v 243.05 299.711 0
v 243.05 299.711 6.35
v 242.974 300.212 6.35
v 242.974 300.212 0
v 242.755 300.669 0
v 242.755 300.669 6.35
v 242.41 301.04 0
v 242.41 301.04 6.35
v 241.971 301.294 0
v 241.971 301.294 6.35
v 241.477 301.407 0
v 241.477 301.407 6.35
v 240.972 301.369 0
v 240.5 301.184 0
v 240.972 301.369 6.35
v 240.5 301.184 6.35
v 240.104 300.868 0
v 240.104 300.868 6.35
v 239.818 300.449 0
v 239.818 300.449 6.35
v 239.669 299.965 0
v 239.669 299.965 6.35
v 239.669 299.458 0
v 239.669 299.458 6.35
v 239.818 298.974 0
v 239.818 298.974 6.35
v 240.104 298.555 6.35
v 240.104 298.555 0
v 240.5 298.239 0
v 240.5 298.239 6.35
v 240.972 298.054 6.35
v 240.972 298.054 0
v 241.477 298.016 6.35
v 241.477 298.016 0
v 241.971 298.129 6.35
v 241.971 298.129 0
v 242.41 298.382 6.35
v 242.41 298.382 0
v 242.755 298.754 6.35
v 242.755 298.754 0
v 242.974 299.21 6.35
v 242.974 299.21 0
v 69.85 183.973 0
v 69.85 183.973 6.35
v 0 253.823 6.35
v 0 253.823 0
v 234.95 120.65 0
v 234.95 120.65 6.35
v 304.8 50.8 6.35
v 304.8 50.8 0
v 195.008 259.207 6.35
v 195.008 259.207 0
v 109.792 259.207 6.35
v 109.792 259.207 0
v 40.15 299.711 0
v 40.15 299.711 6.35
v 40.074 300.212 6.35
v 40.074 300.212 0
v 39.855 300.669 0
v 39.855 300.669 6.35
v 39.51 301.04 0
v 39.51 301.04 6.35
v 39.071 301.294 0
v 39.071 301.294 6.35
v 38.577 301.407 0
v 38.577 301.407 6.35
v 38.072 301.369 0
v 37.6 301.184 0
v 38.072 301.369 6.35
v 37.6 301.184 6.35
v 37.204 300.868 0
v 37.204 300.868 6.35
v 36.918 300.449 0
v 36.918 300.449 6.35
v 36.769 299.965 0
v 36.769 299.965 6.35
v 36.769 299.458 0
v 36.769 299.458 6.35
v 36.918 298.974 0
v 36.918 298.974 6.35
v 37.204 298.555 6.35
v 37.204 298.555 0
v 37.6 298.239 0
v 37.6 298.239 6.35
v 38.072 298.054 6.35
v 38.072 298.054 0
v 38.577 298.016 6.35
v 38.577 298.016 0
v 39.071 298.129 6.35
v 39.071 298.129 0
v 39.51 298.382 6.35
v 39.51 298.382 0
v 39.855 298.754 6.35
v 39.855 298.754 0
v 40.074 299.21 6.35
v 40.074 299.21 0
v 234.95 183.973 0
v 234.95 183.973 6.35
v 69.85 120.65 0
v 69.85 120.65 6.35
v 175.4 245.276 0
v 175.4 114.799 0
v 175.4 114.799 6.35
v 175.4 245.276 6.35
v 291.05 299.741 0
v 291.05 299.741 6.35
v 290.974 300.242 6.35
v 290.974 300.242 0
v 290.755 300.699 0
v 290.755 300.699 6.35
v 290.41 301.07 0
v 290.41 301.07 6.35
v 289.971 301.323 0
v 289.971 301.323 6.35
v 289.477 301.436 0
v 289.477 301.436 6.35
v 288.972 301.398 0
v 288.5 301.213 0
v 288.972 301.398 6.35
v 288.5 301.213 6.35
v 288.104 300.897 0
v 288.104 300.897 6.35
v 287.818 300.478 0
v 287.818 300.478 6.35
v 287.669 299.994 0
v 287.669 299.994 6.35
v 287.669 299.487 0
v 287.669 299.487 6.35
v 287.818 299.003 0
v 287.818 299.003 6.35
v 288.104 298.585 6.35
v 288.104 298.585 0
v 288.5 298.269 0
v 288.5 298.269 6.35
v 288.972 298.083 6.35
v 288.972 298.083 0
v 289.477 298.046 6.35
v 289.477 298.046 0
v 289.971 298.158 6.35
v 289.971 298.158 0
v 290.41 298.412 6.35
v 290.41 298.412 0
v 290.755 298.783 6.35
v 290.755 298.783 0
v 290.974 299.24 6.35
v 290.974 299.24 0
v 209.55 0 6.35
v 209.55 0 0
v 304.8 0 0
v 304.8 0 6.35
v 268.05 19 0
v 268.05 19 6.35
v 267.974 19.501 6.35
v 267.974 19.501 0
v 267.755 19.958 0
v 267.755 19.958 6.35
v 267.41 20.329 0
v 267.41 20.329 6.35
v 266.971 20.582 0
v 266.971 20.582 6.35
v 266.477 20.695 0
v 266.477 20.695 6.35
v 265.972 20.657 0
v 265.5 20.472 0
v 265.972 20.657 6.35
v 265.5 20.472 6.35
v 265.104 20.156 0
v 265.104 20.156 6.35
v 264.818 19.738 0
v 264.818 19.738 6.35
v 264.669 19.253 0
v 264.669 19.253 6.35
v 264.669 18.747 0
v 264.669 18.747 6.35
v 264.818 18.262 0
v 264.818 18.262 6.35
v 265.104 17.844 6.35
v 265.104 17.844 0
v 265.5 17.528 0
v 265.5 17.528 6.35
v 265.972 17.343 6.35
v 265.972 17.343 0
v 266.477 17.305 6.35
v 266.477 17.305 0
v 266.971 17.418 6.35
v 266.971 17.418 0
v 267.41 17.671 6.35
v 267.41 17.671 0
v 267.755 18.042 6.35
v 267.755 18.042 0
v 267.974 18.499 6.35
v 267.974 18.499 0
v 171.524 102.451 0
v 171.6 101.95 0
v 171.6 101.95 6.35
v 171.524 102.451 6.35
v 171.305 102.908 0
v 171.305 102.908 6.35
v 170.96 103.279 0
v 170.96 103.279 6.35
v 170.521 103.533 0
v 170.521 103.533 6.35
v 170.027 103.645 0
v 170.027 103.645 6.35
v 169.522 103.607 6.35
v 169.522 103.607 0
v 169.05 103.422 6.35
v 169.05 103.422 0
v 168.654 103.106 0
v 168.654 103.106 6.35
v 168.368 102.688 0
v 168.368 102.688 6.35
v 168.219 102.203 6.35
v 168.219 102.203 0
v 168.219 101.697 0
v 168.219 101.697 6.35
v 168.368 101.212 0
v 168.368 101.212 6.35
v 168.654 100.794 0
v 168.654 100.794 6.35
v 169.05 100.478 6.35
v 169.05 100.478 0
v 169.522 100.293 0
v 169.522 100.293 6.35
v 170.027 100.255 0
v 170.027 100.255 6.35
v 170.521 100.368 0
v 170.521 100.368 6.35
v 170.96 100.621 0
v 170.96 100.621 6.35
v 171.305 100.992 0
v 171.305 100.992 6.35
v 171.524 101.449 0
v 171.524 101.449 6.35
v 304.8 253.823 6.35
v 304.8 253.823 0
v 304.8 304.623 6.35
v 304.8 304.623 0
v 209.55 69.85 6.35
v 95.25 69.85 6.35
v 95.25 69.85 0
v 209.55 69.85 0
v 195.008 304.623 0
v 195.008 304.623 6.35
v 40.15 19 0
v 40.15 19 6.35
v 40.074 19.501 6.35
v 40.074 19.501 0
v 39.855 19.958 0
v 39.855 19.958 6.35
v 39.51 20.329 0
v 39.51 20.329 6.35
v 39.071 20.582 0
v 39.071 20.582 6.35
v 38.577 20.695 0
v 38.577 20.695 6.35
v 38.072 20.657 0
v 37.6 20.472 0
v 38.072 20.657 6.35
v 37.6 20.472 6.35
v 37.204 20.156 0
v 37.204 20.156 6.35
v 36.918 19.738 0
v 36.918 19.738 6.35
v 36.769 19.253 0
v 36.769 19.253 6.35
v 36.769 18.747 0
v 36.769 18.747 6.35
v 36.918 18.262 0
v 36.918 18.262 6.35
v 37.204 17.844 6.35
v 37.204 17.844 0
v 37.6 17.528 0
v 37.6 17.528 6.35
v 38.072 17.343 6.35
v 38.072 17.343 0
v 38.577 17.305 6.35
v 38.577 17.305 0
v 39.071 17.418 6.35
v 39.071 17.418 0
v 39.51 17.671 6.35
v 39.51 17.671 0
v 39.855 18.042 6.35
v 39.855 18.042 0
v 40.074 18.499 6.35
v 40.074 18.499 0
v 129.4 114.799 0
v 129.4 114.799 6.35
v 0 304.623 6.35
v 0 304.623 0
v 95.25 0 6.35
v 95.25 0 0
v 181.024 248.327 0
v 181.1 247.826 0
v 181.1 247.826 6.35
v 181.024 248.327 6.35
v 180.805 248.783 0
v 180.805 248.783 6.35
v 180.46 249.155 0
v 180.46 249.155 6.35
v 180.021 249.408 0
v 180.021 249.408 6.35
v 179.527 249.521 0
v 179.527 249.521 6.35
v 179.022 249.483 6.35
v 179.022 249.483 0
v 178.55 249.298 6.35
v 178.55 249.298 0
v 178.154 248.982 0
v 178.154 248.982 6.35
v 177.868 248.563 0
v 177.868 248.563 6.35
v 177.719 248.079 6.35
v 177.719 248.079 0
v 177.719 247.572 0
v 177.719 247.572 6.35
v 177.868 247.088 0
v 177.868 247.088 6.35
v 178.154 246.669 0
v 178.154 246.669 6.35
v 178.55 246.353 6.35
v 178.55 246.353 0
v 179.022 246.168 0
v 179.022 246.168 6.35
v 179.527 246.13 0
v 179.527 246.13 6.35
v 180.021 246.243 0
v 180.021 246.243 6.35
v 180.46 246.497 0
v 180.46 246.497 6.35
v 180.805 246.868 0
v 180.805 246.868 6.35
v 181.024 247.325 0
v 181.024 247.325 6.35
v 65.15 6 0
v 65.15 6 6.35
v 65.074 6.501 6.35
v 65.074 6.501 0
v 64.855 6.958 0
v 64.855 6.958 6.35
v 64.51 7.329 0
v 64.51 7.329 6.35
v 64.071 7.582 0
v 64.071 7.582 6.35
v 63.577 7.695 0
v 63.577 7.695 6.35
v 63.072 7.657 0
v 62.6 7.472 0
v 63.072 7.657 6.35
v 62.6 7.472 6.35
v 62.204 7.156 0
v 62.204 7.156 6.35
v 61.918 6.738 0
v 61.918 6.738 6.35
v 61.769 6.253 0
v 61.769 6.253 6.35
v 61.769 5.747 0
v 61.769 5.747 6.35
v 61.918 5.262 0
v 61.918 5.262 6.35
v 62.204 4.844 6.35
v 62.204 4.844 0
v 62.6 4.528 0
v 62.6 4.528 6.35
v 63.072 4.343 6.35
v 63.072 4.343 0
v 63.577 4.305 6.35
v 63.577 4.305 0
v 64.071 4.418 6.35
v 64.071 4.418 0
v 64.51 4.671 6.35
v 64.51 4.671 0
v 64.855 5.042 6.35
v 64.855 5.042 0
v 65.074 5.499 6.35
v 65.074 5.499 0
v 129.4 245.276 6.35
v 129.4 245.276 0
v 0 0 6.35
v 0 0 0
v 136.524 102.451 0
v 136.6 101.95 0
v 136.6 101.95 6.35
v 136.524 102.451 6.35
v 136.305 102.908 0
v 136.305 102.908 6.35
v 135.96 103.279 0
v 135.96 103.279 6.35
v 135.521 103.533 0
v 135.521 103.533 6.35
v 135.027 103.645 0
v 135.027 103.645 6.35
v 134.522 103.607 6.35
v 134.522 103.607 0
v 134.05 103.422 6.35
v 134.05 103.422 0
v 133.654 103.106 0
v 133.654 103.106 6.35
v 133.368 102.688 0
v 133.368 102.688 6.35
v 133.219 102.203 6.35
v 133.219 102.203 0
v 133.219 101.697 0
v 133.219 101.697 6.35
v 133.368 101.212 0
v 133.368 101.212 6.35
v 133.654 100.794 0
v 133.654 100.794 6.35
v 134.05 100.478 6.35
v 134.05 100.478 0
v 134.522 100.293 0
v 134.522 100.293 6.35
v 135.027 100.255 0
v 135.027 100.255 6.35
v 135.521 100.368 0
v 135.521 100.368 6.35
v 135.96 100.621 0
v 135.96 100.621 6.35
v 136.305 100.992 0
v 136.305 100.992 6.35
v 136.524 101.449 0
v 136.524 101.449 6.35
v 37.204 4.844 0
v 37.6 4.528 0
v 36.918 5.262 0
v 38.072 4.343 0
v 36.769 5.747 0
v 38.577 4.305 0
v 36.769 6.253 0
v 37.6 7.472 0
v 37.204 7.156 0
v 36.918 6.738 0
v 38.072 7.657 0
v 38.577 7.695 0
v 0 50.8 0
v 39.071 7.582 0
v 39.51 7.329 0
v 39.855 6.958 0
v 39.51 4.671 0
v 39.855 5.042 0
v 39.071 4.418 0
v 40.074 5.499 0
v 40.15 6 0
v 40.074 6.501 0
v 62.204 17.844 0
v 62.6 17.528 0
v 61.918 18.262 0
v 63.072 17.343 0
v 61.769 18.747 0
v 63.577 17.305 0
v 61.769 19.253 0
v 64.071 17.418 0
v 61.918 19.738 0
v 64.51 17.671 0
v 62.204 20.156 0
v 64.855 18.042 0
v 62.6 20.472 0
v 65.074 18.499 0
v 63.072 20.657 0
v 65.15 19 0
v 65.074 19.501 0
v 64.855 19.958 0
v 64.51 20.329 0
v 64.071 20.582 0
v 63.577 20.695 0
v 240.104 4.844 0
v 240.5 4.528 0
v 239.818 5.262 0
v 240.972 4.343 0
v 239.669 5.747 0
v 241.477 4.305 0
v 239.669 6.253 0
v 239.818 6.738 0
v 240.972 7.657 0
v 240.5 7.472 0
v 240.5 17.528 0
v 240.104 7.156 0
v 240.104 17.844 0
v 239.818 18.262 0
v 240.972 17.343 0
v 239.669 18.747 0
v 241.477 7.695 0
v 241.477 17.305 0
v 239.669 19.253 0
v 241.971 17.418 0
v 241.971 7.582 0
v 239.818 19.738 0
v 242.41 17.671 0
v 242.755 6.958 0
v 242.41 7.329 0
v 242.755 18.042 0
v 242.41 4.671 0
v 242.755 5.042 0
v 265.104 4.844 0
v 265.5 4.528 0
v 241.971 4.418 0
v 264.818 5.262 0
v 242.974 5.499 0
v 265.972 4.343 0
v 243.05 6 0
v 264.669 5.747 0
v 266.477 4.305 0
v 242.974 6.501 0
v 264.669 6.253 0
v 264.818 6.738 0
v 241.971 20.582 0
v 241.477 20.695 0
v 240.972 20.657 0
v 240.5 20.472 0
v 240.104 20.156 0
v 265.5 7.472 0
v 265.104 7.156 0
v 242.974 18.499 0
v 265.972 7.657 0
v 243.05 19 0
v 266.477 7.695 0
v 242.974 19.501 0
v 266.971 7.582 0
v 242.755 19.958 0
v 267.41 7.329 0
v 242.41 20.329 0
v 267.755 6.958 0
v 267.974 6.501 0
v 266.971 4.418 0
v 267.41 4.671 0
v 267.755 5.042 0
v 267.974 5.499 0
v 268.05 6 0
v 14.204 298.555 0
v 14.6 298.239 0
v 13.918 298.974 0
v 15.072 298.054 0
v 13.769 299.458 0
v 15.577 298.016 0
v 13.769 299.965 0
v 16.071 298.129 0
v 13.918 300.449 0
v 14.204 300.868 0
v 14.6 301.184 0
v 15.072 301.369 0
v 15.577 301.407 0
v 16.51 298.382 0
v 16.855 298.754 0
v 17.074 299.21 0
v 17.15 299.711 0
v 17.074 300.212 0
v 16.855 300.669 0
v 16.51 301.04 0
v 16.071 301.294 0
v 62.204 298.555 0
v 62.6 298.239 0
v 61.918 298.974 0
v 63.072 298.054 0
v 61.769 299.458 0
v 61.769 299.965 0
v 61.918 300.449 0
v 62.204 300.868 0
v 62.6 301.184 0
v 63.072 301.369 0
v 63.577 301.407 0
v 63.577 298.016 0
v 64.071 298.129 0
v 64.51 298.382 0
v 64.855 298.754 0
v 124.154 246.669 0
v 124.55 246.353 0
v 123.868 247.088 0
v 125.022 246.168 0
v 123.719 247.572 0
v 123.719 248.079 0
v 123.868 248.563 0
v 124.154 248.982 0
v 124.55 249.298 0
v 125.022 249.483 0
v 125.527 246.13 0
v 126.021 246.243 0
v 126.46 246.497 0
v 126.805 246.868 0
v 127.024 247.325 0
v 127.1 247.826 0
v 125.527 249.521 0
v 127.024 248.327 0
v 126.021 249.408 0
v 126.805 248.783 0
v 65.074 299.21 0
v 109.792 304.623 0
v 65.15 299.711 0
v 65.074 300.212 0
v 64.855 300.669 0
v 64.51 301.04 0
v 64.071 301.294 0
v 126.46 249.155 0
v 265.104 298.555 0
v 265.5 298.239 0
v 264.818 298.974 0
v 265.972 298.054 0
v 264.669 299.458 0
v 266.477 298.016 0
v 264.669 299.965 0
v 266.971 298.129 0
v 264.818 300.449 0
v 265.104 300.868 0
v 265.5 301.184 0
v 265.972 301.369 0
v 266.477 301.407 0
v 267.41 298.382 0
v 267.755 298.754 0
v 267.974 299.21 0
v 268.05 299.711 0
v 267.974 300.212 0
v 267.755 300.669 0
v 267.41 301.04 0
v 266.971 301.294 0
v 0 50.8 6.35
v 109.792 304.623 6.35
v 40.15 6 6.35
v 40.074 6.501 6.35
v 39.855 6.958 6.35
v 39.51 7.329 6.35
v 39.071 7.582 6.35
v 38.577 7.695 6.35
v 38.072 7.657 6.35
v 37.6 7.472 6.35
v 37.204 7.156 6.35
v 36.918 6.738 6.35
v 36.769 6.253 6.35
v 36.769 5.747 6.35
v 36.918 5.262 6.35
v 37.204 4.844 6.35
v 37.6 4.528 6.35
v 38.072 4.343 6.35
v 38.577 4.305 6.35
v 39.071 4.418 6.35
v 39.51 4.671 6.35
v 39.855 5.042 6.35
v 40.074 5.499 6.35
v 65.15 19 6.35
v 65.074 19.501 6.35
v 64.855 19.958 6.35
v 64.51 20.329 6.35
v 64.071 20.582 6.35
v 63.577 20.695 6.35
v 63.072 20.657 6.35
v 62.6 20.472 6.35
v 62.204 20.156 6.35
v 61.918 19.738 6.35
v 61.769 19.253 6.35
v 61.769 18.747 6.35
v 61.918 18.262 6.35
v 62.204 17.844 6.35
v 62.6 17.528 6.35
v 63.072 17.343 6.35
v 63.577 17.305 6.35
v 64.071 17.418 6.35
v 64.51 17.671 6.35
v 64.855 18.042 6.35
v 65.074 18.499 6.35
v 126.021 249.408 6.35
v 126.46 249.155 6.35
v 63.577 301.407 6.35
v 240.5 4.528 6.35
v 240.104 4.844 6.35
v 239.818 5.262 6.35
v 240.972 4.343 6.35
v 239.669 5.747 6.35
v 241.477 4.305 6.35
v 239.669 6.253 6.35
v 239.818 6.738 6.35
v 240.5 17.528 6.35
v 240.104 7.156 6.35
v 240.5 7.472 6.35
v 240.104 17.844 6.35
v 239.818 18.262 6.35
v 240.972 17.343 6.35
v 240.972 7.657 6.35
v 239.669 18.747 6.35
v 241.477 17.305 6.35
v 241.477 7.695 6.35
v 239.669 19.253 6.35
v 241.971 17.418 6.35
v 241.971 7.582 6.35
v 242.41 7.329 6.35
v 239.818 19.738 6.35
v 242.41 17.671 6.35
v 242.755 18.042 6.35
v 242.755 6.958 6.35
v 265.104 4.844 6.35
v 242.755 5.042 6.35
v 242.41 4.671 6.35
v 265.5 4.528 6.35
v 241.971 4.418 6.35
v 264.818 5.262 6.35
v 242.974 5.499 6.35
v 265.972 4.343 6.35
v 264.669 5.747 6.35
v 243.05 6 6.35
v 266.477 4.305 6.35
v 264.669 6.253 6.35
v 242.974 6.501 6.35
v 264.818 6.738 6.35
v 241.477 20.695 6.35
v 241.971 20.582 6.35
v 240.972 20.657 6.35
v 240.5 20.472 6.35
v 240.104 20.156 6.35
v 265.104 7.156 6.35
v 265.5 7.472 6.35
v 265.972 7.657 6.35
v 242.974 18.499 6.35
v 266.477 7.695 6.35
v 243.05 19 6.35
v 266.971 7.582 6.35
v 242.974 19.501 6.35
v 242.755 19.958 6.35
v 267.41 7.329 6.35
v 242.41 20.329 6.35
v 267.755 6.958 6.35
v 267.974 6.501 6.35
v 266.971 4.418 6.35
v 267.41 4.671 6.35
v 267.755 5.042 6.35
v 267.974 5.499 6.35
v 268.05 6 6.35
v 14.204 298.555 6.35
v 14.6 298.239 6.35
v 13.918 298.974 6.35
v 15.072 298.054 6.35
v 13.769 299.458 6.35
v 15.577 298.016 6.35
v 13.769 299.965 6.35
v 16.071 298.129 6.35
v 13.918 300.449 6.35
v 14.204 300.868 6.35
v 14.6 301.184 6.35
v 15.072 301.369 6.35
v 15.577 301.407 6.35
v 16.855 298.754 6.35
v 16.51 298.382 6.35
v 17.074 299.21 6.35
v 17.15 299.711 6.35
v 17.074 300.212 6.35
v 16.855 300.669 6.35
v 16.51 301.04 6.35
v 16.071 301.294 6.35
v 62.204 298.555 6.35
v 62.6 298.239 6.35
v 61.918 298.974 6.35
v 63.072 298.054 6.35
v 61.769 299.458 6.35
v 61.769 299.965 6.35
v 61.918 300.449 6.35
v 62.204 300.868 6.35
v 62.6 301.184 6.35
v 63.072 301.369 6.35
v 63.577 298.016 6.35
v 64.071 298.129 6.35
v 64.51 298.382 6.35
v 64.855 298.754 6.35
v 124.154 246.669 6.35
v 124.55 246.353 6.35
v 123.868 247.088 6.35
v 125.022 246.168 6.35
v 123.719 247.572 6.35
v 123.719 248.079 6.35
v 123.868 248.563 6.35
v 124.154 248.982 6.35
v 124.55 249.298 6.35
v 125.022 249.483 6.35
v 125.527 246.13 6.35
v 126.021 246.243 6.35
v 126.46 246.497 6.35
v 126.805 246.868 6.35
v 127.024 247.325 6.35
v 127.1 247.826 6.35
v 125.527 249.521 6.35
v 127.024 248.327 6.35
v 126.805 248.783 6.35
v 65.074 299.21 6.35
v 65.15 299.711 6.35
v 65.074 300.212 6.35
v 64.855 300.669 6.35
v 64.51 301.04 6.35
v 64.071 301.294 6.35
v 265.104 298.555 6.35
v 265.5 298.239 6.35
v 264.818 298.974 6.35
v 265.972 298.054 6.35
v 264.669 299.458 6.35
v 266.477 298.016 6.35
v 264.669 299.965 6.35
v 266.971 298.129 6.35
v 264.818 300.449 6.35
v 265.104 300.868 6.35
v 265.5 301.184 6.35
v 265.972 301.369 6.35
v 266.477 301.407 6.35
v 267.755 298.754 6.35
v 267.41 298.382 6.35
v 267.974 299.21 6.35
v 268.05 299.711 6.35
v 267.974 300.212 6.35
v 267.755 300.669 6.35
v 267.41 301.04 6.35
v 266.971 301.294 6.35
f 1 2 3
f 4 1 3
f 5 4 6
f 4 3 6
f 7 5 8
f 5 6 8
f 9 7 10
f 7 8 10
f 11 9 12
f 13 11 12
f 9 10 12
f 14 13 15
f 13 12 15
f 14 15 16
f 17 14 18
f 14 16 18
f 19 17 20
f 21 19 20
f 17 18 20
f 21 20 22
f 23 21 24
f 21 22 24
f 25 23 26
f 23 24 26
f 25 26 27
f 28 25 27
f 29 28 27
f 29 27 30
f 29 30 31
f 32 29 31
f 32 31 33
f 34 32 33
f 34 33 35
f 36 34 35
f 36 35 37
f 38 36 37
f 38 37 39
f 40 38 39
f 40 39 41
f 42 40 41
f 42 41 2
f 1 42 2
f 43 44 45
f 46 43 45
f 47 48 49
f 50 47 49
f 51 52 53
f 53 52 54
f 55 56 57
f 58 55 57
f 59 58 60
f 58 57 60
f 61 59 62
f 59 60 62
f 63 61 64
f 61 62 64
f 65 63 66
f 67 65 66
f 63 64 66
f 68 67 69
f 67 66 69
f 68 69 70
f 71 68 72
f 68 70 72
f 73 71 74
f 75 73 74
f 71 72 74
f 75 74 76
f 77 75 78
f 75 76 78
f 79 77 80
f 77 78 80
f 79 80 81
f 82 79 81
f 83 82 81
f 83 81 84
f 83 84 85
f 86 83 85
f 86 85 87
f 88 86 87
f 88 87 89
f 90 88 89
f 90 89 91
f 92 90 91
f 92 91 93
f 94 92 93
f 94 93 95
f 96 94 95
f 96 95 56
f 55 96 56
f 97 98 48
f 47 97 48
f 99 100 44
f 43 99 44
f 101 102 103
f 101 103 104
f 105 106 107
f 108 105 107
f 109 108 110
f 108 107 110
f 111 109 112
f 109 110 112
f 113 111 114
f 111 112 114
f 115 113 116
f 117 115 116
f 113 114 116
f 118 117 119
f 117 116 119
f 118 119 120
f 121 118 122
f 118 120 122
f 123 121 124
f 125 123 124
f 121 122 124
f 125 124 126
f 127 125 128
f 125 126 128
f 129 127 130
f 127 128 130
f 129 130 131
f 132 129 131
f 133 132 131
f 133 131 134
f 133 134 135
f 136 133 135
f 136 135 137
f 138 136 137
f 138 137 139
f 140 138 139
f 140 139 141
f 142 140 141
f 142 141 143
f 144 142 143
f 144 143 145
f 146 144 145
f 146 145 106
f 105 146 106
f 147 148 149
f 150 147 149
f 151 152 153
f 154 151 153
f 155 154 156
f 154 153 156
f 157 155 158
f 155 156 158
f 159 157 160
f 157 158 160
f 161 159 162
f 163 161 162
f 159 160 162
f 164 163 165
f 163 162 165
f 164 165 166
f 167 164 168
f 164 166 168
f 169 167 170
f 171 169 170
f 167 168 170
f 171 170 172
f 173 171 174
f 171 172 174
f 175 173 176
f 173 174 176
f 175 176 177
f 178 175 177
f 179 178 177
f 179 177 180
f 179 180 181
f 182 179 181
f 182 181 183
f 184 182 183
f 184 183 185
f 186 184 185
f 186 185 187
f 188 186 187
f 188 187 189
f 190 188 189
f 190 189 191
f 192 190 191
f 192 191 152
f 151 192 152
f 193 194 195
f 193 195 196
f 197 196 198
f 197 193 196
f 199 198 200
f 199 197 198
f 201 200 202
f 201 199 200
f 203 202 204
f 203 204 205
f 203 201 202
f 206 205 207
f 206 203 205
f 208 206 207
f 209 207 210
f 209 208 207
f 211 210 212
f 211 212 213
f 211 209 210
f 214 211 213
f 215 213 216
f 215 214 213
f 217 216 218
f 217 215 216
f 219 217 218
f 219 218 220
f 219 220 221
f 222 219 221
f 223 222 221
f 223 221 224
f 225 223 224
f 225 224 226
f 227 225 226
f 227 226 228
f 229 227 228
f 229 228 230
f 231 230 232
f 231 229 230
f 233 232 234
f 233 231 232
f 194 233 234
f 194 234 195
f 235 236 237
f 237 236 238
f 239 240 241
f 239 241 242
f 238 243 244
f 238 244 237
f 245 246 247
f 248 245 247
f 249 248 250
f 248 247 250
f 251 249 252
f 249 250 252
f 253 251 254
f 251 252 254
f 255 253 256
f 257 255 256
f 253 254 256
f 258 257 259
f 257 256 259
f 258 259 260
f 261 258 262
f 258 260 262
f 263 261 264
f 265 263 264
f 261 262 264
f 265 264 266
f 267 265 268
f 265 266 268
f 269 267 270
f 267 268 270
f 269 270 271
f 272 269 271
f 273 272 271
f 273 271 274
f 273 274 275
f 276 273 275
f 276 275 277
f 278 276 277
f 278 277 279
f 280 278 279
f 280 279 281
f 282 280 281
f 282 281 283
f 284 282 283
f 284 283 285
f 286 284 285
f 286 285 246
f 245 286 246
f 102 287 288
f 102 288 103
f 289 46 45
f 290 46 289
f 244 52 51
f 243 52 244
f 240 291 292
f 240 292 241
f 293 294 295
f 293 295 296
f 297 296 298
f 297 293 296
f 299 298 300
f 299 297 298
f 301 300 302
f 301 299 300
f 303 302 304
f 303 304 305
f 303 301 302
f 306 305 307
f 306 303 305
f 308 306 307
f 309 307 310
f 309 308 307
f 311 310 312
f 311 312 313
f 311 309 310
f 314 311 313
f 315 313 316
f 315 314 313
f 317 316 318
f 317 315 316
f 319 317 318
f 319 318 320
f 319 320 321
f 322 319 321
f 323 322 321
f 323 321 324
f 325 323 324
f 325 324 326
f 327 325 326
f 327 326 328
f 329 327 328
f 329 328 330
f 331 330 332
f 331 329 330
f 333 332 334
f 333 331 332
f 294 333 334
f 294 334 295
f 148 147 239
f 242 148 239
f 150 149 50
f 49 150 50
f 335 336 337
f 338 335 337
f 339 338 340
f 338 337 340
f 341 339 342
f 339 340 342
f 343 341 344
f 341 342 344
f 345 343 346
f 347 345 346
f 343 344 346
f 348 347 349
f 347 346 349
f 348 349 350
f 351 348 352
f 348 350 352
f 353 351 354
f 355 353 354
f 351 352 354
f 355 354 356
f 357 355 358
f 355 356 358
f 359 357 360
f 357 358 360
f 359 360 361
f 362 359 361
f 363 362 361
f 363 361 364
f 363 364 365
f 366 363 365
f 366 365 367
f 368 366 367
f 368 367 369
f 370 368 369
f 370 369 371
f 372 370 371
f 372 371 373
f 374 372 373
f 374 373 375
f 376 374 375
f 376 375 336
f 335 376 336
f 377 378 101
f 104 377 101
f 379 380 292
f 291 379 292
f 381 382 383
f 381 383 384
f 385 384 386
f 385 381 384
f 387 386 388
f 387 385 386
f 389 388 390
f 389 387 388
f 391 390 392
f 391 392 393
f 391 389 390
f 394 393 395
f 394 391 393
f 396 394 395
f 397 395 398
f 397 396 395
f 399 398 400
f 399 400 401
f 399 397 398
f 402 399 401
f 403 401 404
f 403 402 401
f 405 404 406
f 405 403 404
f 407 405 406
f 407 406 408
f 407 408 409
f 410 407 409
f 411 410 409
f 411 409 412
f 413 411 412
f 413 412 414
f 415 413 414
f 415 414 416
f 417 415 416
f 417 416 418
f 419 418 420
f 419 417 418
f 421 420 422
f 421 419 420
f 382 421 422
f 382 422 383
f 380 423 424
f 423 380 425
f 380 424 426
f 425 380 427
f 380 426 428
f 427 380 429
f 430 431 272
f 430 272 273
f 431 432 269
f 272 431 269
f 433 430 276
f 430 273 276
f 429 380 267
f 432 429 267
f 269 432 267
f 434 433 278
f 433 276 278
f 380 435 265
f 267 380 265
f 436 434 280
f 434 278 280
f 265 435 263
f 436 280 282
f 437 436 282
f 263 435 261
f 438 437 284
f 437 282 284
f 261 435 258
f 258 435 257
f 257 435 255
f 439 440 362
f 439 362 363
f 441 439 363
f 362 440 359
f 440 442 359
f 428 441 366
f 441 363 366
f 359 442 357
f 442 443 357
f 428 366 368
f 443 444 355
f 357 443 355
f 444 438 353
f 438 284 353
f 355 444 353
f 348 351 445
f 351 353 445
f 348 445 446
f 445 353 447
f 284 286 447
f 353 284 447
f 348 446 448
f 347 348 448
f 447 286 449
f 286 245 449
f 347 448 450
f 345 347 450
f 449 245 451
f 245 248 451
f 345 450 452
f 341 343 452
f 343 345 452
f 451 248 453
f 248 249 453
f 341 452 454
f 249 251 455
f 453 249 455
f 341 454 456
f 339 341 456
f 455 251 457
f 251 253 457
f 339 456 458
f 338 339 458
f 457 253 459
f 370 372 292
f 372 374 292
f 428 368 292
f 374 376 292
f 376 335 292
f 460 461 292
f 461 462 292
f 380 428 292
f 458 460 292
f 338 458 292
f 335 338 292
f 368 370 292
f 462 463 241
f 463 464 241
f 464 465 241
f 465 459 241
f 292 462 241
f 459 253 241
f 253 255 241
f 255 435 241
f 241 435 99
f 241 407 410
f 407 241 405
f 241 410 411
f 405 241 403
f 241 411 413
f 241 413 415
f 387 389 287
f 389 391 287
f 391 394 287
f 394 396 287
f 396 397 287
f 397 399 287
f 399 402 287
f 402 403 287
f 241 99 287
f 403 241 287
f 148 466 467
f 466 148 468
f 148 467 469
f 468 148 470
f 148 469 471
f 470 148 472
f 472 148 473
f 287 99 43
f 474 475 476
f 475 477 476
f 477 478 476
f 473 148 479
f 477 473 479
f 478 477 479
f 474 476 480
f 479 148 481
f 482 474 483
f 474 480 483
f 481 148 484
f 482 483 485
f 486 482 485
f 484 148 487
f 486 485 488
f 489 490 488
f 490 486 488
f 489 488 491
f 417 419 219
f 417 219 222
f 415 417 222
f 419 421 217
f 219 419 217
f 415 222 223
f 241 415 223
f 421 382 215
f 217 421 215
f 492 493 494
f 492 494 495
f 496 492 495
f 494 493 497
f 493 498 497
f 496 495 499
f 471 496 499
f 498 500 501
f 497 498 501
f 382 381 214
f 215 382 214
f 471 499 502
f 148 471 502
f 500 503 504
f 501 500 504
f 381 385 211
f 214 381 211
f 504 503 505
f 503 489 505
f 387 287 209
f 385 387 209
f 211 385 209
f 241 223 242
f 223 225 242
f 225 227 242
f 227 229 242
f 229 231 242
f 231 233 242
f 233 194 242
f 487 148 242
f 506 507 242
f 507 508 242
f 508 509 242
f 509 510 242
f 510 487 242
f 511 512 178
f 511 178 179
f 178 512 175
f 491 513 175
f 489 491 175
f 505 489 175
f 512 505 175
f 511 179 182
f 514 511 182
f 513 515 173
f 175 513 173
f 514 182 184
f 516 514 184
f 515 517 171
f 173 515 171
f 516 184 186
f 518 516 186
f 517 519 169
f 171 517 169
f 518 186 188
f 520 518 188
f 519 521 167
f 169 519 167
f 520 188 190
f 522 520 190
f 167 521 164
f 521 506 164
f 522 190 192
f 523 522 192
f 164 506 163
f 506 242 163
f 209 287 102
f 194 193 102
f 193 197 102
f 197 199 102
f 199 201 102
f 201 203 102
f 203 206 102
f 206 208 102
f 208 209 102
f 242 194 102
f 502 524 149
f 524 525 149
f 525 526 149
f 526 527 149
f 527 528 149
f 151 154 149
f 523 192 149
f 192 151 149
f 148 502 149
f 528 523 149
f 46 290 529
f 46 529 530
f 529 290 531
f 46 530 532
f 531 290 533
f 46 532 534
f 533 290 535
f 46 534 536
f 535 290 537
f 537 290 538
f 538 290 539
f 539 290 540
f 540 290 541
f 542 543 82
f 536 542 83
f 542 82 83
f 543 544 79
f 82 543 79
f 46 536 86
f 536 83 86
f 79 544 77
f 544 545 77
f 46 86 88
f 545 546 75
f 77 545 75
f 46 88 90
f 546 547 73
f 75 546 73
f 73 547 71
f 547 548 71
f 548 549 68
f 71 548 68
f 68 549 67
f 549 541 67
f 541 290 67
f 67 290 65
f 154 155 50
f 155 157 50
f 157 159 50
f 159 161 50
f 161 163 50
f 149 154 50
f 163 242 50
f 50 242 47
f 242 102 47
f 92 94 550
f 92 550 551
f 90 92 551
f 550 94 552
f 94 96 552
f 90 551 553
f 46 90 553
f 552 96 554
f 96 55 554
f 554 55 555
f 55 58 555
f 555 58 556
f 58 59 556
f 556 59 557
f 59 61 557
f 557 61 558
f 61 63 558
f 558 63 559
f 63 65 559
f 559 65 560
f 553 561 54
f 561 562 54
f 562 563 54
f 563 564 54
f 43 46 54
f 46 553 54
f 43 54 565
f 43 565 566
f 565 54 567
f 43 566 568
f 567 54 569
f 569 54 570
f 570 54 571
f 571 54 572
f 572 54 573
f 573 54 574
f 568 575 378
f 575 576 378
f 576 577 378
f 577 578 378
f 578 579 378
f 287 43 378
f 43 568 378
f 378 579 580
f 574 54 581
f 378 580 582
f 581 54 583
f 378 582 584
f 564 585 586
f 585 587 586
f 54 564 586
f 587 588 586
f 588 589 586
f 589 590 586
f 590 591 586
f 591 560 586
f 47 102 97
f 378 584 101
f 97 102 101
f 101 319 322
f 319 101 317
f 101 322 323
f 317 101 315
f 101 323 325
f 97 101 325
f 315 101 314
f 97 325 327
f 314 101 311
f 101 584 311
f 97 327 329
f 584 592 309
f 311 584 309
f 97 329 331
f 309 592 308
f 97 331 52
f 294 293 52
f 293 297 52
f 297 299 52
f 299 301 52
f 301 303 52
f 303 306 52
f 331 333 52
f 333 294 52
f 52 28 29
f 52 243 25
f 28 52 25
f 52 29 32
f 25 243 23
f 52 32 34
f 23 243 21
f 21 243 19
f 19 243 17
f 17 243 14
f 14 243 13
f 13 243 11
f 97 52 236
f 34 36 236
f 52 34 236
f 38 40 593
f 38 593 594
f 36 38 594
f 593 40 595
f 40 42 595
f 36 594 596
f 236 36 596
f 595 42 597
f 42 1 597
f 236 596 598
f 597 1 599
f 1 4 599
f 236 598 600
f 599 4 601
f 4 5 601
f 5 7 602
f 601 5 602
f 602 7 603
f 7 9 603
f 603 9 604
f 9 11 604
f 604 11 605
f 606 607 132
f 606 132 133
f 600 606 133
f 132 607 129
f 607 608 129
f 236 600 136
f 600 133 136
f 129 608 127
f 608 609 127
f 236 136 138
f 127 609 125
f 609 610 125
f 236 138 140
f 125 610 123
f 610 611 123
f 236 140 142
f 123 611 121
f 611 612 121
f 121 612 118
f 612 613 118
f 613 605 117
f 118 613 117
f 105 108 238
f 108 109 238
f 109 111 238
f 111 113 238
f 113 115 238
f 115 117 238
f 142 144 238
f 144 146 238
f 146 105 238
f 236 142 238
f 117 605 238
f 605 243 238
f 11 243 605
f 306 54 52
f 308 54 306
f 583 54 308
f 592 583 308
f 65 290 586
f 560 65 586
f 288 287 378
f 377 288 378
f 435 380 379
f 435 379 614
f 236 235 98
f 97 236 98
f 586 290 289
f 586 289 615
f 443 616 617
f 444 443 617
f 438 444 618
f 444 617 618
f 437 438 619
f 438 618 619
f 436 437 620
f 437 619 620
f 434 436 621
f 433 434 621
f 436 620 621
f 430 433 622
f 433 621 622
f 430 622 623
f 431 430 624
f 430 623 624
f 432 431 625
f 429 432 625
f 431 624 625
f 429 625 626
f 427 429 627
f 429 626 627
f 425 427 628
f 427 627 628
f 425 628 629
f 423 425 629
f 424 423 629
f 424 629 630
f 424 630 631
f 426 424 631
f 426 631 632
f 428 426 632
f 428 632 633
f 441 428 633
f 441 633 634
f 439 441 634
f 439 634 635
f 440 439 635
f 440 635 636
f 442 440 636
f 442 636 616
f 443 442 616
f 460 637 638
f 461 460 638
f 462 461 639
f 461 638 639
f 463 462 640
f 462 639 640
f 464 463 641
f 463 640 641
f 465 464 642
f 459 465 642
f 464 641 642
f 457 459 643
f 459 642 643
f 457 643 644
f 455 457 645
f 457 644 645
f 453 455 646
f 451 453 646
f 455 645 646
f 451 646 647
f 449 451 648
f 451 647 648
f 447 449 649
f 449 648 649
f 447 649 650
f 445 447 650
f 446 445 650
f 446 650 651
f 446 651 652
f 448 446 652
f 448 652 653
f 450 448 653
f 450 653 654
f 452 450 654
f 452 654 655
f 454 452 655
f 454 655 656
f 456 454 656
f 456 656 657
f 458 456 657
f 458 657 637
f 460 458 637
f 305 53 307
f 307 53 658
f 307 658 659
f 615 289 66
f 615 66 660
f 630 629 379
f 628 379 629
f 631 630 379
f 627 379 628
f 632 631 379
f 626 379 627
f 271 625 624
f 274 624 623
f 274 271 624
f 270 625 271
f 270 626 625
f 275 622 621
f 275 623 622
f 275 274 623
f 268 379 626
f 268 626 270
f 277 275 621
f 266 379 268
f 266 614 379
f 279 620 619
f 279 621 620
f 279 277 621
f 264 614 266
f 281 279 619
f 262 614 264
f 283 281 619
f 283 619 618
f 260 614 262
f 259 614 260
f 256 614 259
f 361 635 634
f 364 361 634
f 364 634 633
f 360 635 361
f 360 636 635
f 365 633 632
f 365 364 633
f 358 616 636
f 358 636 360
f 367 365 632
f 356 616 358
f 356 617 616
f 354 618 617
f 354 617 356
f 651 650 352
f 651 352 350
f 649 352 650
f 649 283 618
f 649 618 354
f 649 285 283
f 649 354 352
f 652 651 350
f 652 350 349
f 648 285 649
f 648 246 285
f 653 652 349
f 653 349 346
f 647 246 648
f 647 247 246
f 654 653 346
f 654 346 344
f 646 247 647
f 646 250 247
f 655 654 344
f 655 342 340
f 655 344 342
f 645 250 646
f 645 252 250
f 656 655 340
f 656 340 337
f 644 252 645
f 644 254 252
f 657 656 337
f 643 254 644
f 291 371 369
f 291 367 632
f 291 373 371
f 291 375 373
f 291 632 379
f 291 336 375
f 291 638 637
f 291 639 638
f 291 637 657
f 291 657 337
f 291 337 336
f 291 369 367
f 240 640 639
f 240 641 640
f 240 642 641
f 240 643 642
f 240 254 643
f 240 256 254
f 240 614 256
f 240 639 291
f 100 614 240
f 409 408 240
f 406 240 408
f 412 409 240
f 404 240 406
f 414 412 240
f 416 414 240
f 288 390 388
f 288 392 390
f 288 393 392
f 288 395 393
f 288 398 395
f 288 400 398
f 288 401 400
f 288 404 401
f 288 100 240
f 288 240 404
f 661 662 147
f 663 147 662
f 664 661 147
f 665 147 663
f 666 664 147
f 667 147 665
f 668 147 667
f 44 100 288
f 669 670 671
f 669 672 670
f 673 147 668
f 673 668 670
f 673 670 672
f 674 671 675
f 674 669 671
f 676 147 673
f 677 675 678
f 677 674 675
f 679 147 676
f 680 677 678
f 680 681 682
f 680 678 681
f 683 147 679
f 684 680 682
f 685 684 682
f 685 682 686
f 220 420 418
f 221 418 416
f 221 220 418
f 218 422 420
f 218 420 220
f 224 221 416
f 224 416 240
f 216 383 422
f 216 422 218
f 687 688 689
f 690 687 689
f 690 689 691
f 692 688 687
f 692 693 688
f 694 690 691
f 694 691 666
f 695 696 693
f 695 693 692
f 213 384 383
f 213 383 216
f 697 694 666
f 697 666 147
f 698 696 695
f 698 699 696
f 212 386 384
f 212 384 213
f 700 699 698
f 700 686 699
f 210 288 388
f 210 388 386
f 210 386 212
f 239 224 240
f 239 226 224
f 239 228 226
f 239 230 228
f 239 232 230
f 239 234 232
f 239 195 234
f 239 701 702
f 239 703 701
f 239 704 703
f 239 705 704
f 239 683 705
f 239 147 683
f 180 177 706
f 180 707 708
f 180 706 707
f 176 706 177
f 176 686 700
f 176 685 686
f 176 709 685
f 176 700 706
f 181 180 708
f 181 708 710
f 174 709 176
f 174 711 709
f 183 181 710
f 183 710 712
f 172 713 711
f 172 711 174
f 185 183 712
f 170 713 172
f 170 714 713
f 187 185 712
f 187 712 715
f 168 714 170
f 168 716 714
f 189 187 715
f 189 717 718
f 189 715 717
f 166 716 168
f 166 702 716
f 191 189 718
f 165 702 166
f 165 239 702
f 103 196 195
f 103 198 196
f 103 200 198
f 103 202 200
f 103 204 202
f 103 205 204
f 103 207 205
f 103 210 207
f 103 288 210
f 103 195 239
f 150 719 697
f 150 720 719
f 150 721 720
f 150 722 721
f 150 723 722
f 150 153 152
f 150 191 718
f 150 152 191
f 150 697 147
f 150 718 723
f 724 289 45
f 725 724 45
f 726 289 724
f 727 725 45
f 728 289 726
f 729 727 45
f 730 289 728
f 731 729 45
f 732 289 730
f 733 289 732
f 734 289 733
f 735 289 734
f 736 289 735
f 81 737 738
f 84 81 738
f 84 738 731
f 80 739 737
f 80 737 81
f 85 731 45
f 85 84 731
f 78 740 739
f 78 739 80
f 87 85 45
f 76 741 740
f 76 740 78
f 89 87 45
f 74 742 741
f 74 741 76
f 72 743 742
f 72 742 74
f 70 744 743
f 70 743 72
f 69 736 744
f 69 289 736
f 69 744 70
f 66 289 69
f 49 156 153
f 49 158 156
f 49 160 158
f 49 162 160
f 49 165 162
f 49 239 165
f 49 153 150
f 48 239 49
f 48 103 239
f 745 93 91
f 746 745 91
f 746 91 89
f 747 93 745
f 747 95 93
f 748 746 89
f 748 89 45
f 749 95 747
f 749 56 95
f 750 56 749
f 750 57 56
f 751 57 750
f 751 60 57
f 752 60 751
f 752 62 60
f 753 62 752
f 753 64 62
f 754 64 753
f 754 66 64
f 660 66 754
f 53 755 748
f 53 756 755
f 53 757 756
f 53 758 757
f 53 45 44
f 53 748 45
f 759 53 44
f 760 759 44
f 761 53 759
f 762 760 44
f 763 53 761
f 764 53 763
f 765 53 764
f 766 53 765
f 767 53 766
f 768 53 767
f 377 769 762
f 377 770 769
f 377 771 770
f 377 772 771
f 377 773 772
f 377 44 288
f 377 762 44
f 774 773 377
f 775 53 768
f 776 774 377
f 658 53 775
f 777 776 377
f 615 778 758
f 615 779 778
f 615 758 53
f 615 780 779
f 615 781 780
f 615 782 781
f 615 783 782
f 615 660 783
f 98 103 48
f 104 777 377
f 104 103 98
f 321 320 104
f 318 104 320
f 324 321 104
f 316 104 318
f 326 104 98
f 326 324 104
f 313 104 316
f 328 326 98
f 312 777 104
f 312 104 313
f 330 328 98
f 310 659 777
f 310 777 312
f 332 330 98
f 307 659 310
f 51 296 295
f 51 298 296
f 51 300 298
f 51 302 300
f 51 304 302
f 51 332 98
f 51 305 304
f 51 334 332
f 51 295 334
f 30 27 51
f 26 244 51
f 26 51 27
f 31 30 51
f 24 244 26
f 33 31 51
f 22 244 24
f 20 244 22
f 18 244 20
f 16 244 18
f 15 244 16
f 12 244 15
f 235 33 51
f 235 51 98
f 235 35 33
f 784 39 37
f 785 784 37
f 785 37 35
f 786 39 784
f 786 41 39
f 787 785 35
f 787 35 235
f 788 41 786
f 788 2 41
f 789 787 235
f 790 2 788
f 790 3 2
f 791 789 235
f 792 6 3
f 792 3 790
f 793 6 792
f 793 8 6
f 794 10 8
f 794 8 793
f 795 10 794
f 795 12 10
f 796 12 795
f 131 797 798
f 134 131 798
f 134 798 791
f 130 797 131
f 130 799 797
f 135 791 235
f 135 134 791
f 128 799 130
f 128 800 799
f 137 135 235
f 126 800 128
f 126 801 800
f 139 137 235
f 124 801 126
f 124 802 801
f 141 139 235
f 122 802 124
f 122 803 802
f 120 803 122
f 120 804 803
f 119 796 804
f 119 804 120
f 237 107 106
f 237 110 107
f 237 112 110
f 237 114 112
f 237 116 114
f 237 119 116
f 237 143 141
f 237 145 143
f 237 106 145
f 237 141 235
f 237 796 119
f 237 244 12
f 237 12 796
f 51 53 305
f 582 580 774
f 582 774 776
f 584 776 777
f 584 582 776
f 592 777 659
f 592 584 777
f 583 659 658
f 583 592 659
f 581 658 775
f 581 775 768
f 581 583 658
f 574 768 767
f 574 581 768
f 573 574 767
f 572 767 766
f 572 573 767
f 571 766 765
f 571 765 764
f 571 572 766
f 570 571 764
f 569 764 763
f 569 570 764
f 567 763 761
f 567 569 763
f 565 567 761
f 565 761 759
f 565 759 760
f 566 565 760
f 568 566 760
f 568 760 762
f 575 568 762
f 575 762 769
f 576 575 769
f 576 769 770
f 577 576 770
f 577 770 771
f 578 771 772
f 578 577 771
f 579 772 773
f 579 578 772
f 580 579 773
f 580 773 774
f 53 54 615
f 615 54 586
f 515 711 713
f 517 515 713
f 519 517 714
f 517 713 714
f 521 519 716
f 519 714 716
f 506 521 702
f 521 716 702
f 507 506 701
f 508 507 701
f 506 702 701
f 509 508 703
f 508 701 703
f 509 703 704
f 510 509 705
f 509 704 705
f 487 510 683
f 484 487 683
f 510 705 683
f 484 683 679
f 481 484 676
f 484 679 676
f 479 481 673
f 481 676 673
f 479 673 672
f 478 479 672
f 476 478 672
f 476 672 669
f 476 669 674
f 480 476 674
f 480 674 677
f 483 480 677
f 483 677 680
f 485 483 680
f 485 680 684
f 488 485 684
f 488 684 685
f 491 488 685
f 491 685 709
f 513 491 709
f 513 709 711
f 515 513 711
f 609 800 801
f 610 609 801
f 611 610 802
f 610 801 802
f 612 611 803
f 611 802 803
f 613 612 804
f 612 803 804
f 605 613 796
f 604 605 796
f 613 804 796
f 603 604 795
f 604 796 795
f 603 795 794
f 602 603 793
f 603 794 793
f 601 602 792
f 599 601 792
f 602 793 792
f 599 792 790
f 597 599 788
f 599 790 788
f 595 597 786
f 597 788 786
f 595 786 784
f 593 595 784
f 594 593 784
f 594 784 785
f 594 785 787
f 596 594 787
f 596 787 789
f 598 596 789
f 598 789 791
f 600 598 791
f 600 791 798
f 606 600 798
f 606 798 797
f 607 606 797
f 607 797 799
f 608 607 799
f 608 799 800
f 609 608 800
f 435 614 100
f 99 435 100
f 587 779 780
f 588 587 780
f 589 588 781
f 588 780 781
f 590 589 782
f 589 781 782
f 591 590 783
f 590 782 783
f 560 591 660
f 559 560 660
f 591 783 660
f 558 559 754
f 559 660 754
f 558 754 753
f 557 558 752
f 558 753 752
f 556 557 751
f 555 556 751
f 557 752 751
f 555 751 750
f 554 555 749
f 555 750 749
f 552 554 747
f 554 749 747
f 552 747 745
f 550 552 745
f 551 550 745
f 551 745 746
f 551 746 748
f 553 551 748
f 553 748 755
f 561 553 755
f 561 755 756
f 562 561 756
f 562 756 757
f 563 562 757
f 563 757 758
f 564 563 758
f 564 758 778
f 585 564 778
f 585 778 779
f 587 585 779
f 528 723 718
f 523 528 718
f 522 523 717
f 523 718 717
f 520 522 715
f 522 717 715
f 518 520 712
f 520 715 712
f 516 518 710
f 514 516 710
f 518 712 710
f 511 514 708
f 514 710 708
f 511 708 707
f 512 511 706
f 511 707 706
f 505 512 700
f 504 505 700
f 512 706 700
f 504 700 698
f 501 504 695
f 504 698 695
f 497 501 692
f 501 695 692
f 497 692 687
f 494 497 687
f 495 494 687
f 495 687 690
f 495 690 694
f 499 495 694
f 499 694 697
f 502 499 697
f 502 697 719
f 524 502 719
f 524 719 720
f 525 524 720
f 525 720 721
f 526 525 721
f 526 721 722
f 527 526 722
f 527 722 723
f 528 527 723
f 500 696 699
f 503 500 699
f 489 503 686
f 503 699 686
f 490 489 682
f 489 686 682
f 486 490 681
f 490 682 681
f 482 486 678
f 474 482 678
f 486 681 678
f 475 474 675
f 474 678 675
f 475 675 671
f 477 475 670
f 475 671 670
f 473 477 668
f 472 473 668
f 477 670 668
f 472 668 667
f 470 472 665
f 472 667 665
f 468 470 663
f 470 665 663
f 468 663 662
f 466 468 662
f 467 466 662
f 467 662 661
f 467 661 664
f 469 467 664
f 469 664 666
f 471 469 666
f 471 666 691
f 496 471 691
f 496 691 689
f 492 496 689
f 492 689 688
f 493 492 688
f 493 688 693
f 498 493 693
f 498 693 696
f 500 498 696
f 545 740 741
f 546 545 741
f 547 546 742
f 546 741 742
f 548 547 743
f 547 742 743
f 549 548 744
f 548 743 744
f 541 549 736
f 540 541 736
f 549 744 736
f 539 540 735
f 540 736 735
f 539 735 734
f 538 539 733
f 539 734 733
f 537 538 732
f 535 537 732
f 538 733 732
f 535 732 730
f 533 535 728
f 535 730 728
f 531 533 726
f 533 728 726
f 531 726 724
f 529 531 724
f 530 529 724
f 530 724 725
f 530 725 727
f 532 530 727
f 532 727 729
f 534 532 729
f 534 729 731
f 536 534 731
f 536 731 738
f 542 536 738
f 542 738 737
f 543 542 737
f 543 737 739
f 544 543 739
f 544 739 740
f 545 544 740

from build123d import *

# Parameters (mm, degrees)
SKETCH1_W              = 304.8
SKETCH1_H              = 304.622712027
BOSS_EXTRUDE1_DEPTH    = 6.35
CUT_EXTRUDE1_START     = -6.35
CUT_EXTRUDE1_OUTLINE_R = 1.7
CUT_EXTRUDE1_OUTLINE_W = 46
CUT_EXTRUDE1_OUTLINE_H = 130.477204634
CUT_EXTRUDE1_DEPTH     = 6.35
SKETCH4_W              = 85.216118386
SKETCH4_H              = 49.623018197
CUT_EXTRUDE2_DEPTH     = 10
SKETCH5_R              = 1.7
CUT_EXTRUDE3_DEPTH     = 21
SKETCH6_R              = 1.7
CUT_EXTRUDE4_DEPTH     = 21
SKETCH7_W              = 114.3
SKETCH7_H              = 69.85
CUT_EXTRUDE5_DEPTH     = 10


# Read off the part's stored shape, not the designer's step: Cut-Extrude1
with BuildPart() as part:
    # Sketch1 → Boss-Extrude1 (new body)
    with BuildSketch(Plane.XY):
        with Locations((152.4, 152.311356014)):
            Rectangle(SKETCH1_W, SKETCH1_H)
    extrude(amount=BOSS_EXTRUDE1_DEPTH)

    # Cut-Extrude1 outline → Cut-Extrude1 (cut)
    with BuildSketch(Plane.XY.offset(6.35).offset(CUT_EXTRUDE1_START)):
        with Locations((169.9, 101.950028876)):
            Circle(CUT_EXTRUDE1_OUTLINE_R)
        with Locations((152.4, 180.037397769)):
            Rectangle(CUT_EXTRUDE1_OUTLINE_W, CUT_EXTRUDE1_OUTLINE_H)
        with Locations((125.4, 247.82572008)):
            Circle(CUT_EXTRUDE1_OUTLINE_R)
        with Locations((179.4, 247.82572008)):
            Circle(CUT_EXTRUDE1_OUTLINE_R)
        with Locations((134.9, 101.950028876)):
            Circle(CUT_EXTRUDE1_OUTLINE_R)
    extrude(amount=CUT_EXTRUDE1_DEPTH, mode=Mode.SUBTRACT)

    # Sketch4 → Cut-Extrude2 (cut)
    with BuildSketch(Plane(origin=(0, 0, 0), x_dir=(-1, 0, 0), z_dir=(0, 0, -1))):
        with Locations((-152.4, 284.018084638)):
            Rectangle(SKETCH4_W, SKETCH4_H)
    extrude(amount=-CUT_EXTRUDE2_DEPTH, mode=Mode.SUBTRACT)

    # Sketch5 → Cut-Extrude3 (cut)
    with BuildSketch(Plane.XY.offset(6.35)):
        with Locations((241.35, 299.711356013)):
            Circle(SKETCH5_R)
        with Locations((266.35, 299.711356013)):
            Circle(SKETCH5_R)
        with Locations((38.45, 299.711356013)):
            Circle(SKETCH5_R)
        with Locations((63.45, 299.711356013)):
            Circle(SKETCH5_R)
        with Locations((241.35, 19.000000001)):
            Circle(SKETCH5_R)
        with Locations((241.35, 6.000000001)):
            Circle(SKETCH5_R)
        with Locations((266.35, 19.000000001)):
            Circle(SKETCH5_R)
        with Locations((266.35, 6.000000001)):
            Circle(SKETCH5_R)
        with Locations((63.45, 6)):
            Circle(SKETCH5_R)
        with Locations((38.45, 6)):
            Circle(SKETCH5_R)
        with Locations((63.45, 19)):
            Circle(SKETCH5_R)
        with Locations((38.45, 19)):
            Circle(SKETCH5_R)
    extrude(amount=-CUT_EXTRUDE3_DEPTH, mode=Mode.SUBTRACT)

    # Sketch6 → Cut-Extrude4 (cut)
    with BuildSketch(Plane.XY.offset(6.35)):
        with Locations((289.349981069, 299.740865879)):
            Circle(SKETCH6_R)
        with Locations((15.45, 299.711356012)):
            Circle(SKETCH6_R)
    extrude(amount=-CUT_EXTRUDE4_DEPTH, mode=Mode.SUBTRACT)

    # Sketch7 → Cut-Extrude5 (cut)
    with BuildSketch(Plane.XY.offset(6.35)):
        Polygon((0, 253.822712027), (0, 50.8), (69.85, 120.65), (69.85, 183.972712027), align=None)
        with Locations((152.4, 34.925)):
            Rectangle(SKETCH7_W, SKETCH7_H)
        Polygon((234.95, 120.65), (304.8, 50.8), (304.8, 253.822712027), (234.95, 183.972712027), align=None)
    extrude(amount=-CUT_EXTRUDE5_DEPTH, mode=Mode.SUBTRACT)


solid = part.part
